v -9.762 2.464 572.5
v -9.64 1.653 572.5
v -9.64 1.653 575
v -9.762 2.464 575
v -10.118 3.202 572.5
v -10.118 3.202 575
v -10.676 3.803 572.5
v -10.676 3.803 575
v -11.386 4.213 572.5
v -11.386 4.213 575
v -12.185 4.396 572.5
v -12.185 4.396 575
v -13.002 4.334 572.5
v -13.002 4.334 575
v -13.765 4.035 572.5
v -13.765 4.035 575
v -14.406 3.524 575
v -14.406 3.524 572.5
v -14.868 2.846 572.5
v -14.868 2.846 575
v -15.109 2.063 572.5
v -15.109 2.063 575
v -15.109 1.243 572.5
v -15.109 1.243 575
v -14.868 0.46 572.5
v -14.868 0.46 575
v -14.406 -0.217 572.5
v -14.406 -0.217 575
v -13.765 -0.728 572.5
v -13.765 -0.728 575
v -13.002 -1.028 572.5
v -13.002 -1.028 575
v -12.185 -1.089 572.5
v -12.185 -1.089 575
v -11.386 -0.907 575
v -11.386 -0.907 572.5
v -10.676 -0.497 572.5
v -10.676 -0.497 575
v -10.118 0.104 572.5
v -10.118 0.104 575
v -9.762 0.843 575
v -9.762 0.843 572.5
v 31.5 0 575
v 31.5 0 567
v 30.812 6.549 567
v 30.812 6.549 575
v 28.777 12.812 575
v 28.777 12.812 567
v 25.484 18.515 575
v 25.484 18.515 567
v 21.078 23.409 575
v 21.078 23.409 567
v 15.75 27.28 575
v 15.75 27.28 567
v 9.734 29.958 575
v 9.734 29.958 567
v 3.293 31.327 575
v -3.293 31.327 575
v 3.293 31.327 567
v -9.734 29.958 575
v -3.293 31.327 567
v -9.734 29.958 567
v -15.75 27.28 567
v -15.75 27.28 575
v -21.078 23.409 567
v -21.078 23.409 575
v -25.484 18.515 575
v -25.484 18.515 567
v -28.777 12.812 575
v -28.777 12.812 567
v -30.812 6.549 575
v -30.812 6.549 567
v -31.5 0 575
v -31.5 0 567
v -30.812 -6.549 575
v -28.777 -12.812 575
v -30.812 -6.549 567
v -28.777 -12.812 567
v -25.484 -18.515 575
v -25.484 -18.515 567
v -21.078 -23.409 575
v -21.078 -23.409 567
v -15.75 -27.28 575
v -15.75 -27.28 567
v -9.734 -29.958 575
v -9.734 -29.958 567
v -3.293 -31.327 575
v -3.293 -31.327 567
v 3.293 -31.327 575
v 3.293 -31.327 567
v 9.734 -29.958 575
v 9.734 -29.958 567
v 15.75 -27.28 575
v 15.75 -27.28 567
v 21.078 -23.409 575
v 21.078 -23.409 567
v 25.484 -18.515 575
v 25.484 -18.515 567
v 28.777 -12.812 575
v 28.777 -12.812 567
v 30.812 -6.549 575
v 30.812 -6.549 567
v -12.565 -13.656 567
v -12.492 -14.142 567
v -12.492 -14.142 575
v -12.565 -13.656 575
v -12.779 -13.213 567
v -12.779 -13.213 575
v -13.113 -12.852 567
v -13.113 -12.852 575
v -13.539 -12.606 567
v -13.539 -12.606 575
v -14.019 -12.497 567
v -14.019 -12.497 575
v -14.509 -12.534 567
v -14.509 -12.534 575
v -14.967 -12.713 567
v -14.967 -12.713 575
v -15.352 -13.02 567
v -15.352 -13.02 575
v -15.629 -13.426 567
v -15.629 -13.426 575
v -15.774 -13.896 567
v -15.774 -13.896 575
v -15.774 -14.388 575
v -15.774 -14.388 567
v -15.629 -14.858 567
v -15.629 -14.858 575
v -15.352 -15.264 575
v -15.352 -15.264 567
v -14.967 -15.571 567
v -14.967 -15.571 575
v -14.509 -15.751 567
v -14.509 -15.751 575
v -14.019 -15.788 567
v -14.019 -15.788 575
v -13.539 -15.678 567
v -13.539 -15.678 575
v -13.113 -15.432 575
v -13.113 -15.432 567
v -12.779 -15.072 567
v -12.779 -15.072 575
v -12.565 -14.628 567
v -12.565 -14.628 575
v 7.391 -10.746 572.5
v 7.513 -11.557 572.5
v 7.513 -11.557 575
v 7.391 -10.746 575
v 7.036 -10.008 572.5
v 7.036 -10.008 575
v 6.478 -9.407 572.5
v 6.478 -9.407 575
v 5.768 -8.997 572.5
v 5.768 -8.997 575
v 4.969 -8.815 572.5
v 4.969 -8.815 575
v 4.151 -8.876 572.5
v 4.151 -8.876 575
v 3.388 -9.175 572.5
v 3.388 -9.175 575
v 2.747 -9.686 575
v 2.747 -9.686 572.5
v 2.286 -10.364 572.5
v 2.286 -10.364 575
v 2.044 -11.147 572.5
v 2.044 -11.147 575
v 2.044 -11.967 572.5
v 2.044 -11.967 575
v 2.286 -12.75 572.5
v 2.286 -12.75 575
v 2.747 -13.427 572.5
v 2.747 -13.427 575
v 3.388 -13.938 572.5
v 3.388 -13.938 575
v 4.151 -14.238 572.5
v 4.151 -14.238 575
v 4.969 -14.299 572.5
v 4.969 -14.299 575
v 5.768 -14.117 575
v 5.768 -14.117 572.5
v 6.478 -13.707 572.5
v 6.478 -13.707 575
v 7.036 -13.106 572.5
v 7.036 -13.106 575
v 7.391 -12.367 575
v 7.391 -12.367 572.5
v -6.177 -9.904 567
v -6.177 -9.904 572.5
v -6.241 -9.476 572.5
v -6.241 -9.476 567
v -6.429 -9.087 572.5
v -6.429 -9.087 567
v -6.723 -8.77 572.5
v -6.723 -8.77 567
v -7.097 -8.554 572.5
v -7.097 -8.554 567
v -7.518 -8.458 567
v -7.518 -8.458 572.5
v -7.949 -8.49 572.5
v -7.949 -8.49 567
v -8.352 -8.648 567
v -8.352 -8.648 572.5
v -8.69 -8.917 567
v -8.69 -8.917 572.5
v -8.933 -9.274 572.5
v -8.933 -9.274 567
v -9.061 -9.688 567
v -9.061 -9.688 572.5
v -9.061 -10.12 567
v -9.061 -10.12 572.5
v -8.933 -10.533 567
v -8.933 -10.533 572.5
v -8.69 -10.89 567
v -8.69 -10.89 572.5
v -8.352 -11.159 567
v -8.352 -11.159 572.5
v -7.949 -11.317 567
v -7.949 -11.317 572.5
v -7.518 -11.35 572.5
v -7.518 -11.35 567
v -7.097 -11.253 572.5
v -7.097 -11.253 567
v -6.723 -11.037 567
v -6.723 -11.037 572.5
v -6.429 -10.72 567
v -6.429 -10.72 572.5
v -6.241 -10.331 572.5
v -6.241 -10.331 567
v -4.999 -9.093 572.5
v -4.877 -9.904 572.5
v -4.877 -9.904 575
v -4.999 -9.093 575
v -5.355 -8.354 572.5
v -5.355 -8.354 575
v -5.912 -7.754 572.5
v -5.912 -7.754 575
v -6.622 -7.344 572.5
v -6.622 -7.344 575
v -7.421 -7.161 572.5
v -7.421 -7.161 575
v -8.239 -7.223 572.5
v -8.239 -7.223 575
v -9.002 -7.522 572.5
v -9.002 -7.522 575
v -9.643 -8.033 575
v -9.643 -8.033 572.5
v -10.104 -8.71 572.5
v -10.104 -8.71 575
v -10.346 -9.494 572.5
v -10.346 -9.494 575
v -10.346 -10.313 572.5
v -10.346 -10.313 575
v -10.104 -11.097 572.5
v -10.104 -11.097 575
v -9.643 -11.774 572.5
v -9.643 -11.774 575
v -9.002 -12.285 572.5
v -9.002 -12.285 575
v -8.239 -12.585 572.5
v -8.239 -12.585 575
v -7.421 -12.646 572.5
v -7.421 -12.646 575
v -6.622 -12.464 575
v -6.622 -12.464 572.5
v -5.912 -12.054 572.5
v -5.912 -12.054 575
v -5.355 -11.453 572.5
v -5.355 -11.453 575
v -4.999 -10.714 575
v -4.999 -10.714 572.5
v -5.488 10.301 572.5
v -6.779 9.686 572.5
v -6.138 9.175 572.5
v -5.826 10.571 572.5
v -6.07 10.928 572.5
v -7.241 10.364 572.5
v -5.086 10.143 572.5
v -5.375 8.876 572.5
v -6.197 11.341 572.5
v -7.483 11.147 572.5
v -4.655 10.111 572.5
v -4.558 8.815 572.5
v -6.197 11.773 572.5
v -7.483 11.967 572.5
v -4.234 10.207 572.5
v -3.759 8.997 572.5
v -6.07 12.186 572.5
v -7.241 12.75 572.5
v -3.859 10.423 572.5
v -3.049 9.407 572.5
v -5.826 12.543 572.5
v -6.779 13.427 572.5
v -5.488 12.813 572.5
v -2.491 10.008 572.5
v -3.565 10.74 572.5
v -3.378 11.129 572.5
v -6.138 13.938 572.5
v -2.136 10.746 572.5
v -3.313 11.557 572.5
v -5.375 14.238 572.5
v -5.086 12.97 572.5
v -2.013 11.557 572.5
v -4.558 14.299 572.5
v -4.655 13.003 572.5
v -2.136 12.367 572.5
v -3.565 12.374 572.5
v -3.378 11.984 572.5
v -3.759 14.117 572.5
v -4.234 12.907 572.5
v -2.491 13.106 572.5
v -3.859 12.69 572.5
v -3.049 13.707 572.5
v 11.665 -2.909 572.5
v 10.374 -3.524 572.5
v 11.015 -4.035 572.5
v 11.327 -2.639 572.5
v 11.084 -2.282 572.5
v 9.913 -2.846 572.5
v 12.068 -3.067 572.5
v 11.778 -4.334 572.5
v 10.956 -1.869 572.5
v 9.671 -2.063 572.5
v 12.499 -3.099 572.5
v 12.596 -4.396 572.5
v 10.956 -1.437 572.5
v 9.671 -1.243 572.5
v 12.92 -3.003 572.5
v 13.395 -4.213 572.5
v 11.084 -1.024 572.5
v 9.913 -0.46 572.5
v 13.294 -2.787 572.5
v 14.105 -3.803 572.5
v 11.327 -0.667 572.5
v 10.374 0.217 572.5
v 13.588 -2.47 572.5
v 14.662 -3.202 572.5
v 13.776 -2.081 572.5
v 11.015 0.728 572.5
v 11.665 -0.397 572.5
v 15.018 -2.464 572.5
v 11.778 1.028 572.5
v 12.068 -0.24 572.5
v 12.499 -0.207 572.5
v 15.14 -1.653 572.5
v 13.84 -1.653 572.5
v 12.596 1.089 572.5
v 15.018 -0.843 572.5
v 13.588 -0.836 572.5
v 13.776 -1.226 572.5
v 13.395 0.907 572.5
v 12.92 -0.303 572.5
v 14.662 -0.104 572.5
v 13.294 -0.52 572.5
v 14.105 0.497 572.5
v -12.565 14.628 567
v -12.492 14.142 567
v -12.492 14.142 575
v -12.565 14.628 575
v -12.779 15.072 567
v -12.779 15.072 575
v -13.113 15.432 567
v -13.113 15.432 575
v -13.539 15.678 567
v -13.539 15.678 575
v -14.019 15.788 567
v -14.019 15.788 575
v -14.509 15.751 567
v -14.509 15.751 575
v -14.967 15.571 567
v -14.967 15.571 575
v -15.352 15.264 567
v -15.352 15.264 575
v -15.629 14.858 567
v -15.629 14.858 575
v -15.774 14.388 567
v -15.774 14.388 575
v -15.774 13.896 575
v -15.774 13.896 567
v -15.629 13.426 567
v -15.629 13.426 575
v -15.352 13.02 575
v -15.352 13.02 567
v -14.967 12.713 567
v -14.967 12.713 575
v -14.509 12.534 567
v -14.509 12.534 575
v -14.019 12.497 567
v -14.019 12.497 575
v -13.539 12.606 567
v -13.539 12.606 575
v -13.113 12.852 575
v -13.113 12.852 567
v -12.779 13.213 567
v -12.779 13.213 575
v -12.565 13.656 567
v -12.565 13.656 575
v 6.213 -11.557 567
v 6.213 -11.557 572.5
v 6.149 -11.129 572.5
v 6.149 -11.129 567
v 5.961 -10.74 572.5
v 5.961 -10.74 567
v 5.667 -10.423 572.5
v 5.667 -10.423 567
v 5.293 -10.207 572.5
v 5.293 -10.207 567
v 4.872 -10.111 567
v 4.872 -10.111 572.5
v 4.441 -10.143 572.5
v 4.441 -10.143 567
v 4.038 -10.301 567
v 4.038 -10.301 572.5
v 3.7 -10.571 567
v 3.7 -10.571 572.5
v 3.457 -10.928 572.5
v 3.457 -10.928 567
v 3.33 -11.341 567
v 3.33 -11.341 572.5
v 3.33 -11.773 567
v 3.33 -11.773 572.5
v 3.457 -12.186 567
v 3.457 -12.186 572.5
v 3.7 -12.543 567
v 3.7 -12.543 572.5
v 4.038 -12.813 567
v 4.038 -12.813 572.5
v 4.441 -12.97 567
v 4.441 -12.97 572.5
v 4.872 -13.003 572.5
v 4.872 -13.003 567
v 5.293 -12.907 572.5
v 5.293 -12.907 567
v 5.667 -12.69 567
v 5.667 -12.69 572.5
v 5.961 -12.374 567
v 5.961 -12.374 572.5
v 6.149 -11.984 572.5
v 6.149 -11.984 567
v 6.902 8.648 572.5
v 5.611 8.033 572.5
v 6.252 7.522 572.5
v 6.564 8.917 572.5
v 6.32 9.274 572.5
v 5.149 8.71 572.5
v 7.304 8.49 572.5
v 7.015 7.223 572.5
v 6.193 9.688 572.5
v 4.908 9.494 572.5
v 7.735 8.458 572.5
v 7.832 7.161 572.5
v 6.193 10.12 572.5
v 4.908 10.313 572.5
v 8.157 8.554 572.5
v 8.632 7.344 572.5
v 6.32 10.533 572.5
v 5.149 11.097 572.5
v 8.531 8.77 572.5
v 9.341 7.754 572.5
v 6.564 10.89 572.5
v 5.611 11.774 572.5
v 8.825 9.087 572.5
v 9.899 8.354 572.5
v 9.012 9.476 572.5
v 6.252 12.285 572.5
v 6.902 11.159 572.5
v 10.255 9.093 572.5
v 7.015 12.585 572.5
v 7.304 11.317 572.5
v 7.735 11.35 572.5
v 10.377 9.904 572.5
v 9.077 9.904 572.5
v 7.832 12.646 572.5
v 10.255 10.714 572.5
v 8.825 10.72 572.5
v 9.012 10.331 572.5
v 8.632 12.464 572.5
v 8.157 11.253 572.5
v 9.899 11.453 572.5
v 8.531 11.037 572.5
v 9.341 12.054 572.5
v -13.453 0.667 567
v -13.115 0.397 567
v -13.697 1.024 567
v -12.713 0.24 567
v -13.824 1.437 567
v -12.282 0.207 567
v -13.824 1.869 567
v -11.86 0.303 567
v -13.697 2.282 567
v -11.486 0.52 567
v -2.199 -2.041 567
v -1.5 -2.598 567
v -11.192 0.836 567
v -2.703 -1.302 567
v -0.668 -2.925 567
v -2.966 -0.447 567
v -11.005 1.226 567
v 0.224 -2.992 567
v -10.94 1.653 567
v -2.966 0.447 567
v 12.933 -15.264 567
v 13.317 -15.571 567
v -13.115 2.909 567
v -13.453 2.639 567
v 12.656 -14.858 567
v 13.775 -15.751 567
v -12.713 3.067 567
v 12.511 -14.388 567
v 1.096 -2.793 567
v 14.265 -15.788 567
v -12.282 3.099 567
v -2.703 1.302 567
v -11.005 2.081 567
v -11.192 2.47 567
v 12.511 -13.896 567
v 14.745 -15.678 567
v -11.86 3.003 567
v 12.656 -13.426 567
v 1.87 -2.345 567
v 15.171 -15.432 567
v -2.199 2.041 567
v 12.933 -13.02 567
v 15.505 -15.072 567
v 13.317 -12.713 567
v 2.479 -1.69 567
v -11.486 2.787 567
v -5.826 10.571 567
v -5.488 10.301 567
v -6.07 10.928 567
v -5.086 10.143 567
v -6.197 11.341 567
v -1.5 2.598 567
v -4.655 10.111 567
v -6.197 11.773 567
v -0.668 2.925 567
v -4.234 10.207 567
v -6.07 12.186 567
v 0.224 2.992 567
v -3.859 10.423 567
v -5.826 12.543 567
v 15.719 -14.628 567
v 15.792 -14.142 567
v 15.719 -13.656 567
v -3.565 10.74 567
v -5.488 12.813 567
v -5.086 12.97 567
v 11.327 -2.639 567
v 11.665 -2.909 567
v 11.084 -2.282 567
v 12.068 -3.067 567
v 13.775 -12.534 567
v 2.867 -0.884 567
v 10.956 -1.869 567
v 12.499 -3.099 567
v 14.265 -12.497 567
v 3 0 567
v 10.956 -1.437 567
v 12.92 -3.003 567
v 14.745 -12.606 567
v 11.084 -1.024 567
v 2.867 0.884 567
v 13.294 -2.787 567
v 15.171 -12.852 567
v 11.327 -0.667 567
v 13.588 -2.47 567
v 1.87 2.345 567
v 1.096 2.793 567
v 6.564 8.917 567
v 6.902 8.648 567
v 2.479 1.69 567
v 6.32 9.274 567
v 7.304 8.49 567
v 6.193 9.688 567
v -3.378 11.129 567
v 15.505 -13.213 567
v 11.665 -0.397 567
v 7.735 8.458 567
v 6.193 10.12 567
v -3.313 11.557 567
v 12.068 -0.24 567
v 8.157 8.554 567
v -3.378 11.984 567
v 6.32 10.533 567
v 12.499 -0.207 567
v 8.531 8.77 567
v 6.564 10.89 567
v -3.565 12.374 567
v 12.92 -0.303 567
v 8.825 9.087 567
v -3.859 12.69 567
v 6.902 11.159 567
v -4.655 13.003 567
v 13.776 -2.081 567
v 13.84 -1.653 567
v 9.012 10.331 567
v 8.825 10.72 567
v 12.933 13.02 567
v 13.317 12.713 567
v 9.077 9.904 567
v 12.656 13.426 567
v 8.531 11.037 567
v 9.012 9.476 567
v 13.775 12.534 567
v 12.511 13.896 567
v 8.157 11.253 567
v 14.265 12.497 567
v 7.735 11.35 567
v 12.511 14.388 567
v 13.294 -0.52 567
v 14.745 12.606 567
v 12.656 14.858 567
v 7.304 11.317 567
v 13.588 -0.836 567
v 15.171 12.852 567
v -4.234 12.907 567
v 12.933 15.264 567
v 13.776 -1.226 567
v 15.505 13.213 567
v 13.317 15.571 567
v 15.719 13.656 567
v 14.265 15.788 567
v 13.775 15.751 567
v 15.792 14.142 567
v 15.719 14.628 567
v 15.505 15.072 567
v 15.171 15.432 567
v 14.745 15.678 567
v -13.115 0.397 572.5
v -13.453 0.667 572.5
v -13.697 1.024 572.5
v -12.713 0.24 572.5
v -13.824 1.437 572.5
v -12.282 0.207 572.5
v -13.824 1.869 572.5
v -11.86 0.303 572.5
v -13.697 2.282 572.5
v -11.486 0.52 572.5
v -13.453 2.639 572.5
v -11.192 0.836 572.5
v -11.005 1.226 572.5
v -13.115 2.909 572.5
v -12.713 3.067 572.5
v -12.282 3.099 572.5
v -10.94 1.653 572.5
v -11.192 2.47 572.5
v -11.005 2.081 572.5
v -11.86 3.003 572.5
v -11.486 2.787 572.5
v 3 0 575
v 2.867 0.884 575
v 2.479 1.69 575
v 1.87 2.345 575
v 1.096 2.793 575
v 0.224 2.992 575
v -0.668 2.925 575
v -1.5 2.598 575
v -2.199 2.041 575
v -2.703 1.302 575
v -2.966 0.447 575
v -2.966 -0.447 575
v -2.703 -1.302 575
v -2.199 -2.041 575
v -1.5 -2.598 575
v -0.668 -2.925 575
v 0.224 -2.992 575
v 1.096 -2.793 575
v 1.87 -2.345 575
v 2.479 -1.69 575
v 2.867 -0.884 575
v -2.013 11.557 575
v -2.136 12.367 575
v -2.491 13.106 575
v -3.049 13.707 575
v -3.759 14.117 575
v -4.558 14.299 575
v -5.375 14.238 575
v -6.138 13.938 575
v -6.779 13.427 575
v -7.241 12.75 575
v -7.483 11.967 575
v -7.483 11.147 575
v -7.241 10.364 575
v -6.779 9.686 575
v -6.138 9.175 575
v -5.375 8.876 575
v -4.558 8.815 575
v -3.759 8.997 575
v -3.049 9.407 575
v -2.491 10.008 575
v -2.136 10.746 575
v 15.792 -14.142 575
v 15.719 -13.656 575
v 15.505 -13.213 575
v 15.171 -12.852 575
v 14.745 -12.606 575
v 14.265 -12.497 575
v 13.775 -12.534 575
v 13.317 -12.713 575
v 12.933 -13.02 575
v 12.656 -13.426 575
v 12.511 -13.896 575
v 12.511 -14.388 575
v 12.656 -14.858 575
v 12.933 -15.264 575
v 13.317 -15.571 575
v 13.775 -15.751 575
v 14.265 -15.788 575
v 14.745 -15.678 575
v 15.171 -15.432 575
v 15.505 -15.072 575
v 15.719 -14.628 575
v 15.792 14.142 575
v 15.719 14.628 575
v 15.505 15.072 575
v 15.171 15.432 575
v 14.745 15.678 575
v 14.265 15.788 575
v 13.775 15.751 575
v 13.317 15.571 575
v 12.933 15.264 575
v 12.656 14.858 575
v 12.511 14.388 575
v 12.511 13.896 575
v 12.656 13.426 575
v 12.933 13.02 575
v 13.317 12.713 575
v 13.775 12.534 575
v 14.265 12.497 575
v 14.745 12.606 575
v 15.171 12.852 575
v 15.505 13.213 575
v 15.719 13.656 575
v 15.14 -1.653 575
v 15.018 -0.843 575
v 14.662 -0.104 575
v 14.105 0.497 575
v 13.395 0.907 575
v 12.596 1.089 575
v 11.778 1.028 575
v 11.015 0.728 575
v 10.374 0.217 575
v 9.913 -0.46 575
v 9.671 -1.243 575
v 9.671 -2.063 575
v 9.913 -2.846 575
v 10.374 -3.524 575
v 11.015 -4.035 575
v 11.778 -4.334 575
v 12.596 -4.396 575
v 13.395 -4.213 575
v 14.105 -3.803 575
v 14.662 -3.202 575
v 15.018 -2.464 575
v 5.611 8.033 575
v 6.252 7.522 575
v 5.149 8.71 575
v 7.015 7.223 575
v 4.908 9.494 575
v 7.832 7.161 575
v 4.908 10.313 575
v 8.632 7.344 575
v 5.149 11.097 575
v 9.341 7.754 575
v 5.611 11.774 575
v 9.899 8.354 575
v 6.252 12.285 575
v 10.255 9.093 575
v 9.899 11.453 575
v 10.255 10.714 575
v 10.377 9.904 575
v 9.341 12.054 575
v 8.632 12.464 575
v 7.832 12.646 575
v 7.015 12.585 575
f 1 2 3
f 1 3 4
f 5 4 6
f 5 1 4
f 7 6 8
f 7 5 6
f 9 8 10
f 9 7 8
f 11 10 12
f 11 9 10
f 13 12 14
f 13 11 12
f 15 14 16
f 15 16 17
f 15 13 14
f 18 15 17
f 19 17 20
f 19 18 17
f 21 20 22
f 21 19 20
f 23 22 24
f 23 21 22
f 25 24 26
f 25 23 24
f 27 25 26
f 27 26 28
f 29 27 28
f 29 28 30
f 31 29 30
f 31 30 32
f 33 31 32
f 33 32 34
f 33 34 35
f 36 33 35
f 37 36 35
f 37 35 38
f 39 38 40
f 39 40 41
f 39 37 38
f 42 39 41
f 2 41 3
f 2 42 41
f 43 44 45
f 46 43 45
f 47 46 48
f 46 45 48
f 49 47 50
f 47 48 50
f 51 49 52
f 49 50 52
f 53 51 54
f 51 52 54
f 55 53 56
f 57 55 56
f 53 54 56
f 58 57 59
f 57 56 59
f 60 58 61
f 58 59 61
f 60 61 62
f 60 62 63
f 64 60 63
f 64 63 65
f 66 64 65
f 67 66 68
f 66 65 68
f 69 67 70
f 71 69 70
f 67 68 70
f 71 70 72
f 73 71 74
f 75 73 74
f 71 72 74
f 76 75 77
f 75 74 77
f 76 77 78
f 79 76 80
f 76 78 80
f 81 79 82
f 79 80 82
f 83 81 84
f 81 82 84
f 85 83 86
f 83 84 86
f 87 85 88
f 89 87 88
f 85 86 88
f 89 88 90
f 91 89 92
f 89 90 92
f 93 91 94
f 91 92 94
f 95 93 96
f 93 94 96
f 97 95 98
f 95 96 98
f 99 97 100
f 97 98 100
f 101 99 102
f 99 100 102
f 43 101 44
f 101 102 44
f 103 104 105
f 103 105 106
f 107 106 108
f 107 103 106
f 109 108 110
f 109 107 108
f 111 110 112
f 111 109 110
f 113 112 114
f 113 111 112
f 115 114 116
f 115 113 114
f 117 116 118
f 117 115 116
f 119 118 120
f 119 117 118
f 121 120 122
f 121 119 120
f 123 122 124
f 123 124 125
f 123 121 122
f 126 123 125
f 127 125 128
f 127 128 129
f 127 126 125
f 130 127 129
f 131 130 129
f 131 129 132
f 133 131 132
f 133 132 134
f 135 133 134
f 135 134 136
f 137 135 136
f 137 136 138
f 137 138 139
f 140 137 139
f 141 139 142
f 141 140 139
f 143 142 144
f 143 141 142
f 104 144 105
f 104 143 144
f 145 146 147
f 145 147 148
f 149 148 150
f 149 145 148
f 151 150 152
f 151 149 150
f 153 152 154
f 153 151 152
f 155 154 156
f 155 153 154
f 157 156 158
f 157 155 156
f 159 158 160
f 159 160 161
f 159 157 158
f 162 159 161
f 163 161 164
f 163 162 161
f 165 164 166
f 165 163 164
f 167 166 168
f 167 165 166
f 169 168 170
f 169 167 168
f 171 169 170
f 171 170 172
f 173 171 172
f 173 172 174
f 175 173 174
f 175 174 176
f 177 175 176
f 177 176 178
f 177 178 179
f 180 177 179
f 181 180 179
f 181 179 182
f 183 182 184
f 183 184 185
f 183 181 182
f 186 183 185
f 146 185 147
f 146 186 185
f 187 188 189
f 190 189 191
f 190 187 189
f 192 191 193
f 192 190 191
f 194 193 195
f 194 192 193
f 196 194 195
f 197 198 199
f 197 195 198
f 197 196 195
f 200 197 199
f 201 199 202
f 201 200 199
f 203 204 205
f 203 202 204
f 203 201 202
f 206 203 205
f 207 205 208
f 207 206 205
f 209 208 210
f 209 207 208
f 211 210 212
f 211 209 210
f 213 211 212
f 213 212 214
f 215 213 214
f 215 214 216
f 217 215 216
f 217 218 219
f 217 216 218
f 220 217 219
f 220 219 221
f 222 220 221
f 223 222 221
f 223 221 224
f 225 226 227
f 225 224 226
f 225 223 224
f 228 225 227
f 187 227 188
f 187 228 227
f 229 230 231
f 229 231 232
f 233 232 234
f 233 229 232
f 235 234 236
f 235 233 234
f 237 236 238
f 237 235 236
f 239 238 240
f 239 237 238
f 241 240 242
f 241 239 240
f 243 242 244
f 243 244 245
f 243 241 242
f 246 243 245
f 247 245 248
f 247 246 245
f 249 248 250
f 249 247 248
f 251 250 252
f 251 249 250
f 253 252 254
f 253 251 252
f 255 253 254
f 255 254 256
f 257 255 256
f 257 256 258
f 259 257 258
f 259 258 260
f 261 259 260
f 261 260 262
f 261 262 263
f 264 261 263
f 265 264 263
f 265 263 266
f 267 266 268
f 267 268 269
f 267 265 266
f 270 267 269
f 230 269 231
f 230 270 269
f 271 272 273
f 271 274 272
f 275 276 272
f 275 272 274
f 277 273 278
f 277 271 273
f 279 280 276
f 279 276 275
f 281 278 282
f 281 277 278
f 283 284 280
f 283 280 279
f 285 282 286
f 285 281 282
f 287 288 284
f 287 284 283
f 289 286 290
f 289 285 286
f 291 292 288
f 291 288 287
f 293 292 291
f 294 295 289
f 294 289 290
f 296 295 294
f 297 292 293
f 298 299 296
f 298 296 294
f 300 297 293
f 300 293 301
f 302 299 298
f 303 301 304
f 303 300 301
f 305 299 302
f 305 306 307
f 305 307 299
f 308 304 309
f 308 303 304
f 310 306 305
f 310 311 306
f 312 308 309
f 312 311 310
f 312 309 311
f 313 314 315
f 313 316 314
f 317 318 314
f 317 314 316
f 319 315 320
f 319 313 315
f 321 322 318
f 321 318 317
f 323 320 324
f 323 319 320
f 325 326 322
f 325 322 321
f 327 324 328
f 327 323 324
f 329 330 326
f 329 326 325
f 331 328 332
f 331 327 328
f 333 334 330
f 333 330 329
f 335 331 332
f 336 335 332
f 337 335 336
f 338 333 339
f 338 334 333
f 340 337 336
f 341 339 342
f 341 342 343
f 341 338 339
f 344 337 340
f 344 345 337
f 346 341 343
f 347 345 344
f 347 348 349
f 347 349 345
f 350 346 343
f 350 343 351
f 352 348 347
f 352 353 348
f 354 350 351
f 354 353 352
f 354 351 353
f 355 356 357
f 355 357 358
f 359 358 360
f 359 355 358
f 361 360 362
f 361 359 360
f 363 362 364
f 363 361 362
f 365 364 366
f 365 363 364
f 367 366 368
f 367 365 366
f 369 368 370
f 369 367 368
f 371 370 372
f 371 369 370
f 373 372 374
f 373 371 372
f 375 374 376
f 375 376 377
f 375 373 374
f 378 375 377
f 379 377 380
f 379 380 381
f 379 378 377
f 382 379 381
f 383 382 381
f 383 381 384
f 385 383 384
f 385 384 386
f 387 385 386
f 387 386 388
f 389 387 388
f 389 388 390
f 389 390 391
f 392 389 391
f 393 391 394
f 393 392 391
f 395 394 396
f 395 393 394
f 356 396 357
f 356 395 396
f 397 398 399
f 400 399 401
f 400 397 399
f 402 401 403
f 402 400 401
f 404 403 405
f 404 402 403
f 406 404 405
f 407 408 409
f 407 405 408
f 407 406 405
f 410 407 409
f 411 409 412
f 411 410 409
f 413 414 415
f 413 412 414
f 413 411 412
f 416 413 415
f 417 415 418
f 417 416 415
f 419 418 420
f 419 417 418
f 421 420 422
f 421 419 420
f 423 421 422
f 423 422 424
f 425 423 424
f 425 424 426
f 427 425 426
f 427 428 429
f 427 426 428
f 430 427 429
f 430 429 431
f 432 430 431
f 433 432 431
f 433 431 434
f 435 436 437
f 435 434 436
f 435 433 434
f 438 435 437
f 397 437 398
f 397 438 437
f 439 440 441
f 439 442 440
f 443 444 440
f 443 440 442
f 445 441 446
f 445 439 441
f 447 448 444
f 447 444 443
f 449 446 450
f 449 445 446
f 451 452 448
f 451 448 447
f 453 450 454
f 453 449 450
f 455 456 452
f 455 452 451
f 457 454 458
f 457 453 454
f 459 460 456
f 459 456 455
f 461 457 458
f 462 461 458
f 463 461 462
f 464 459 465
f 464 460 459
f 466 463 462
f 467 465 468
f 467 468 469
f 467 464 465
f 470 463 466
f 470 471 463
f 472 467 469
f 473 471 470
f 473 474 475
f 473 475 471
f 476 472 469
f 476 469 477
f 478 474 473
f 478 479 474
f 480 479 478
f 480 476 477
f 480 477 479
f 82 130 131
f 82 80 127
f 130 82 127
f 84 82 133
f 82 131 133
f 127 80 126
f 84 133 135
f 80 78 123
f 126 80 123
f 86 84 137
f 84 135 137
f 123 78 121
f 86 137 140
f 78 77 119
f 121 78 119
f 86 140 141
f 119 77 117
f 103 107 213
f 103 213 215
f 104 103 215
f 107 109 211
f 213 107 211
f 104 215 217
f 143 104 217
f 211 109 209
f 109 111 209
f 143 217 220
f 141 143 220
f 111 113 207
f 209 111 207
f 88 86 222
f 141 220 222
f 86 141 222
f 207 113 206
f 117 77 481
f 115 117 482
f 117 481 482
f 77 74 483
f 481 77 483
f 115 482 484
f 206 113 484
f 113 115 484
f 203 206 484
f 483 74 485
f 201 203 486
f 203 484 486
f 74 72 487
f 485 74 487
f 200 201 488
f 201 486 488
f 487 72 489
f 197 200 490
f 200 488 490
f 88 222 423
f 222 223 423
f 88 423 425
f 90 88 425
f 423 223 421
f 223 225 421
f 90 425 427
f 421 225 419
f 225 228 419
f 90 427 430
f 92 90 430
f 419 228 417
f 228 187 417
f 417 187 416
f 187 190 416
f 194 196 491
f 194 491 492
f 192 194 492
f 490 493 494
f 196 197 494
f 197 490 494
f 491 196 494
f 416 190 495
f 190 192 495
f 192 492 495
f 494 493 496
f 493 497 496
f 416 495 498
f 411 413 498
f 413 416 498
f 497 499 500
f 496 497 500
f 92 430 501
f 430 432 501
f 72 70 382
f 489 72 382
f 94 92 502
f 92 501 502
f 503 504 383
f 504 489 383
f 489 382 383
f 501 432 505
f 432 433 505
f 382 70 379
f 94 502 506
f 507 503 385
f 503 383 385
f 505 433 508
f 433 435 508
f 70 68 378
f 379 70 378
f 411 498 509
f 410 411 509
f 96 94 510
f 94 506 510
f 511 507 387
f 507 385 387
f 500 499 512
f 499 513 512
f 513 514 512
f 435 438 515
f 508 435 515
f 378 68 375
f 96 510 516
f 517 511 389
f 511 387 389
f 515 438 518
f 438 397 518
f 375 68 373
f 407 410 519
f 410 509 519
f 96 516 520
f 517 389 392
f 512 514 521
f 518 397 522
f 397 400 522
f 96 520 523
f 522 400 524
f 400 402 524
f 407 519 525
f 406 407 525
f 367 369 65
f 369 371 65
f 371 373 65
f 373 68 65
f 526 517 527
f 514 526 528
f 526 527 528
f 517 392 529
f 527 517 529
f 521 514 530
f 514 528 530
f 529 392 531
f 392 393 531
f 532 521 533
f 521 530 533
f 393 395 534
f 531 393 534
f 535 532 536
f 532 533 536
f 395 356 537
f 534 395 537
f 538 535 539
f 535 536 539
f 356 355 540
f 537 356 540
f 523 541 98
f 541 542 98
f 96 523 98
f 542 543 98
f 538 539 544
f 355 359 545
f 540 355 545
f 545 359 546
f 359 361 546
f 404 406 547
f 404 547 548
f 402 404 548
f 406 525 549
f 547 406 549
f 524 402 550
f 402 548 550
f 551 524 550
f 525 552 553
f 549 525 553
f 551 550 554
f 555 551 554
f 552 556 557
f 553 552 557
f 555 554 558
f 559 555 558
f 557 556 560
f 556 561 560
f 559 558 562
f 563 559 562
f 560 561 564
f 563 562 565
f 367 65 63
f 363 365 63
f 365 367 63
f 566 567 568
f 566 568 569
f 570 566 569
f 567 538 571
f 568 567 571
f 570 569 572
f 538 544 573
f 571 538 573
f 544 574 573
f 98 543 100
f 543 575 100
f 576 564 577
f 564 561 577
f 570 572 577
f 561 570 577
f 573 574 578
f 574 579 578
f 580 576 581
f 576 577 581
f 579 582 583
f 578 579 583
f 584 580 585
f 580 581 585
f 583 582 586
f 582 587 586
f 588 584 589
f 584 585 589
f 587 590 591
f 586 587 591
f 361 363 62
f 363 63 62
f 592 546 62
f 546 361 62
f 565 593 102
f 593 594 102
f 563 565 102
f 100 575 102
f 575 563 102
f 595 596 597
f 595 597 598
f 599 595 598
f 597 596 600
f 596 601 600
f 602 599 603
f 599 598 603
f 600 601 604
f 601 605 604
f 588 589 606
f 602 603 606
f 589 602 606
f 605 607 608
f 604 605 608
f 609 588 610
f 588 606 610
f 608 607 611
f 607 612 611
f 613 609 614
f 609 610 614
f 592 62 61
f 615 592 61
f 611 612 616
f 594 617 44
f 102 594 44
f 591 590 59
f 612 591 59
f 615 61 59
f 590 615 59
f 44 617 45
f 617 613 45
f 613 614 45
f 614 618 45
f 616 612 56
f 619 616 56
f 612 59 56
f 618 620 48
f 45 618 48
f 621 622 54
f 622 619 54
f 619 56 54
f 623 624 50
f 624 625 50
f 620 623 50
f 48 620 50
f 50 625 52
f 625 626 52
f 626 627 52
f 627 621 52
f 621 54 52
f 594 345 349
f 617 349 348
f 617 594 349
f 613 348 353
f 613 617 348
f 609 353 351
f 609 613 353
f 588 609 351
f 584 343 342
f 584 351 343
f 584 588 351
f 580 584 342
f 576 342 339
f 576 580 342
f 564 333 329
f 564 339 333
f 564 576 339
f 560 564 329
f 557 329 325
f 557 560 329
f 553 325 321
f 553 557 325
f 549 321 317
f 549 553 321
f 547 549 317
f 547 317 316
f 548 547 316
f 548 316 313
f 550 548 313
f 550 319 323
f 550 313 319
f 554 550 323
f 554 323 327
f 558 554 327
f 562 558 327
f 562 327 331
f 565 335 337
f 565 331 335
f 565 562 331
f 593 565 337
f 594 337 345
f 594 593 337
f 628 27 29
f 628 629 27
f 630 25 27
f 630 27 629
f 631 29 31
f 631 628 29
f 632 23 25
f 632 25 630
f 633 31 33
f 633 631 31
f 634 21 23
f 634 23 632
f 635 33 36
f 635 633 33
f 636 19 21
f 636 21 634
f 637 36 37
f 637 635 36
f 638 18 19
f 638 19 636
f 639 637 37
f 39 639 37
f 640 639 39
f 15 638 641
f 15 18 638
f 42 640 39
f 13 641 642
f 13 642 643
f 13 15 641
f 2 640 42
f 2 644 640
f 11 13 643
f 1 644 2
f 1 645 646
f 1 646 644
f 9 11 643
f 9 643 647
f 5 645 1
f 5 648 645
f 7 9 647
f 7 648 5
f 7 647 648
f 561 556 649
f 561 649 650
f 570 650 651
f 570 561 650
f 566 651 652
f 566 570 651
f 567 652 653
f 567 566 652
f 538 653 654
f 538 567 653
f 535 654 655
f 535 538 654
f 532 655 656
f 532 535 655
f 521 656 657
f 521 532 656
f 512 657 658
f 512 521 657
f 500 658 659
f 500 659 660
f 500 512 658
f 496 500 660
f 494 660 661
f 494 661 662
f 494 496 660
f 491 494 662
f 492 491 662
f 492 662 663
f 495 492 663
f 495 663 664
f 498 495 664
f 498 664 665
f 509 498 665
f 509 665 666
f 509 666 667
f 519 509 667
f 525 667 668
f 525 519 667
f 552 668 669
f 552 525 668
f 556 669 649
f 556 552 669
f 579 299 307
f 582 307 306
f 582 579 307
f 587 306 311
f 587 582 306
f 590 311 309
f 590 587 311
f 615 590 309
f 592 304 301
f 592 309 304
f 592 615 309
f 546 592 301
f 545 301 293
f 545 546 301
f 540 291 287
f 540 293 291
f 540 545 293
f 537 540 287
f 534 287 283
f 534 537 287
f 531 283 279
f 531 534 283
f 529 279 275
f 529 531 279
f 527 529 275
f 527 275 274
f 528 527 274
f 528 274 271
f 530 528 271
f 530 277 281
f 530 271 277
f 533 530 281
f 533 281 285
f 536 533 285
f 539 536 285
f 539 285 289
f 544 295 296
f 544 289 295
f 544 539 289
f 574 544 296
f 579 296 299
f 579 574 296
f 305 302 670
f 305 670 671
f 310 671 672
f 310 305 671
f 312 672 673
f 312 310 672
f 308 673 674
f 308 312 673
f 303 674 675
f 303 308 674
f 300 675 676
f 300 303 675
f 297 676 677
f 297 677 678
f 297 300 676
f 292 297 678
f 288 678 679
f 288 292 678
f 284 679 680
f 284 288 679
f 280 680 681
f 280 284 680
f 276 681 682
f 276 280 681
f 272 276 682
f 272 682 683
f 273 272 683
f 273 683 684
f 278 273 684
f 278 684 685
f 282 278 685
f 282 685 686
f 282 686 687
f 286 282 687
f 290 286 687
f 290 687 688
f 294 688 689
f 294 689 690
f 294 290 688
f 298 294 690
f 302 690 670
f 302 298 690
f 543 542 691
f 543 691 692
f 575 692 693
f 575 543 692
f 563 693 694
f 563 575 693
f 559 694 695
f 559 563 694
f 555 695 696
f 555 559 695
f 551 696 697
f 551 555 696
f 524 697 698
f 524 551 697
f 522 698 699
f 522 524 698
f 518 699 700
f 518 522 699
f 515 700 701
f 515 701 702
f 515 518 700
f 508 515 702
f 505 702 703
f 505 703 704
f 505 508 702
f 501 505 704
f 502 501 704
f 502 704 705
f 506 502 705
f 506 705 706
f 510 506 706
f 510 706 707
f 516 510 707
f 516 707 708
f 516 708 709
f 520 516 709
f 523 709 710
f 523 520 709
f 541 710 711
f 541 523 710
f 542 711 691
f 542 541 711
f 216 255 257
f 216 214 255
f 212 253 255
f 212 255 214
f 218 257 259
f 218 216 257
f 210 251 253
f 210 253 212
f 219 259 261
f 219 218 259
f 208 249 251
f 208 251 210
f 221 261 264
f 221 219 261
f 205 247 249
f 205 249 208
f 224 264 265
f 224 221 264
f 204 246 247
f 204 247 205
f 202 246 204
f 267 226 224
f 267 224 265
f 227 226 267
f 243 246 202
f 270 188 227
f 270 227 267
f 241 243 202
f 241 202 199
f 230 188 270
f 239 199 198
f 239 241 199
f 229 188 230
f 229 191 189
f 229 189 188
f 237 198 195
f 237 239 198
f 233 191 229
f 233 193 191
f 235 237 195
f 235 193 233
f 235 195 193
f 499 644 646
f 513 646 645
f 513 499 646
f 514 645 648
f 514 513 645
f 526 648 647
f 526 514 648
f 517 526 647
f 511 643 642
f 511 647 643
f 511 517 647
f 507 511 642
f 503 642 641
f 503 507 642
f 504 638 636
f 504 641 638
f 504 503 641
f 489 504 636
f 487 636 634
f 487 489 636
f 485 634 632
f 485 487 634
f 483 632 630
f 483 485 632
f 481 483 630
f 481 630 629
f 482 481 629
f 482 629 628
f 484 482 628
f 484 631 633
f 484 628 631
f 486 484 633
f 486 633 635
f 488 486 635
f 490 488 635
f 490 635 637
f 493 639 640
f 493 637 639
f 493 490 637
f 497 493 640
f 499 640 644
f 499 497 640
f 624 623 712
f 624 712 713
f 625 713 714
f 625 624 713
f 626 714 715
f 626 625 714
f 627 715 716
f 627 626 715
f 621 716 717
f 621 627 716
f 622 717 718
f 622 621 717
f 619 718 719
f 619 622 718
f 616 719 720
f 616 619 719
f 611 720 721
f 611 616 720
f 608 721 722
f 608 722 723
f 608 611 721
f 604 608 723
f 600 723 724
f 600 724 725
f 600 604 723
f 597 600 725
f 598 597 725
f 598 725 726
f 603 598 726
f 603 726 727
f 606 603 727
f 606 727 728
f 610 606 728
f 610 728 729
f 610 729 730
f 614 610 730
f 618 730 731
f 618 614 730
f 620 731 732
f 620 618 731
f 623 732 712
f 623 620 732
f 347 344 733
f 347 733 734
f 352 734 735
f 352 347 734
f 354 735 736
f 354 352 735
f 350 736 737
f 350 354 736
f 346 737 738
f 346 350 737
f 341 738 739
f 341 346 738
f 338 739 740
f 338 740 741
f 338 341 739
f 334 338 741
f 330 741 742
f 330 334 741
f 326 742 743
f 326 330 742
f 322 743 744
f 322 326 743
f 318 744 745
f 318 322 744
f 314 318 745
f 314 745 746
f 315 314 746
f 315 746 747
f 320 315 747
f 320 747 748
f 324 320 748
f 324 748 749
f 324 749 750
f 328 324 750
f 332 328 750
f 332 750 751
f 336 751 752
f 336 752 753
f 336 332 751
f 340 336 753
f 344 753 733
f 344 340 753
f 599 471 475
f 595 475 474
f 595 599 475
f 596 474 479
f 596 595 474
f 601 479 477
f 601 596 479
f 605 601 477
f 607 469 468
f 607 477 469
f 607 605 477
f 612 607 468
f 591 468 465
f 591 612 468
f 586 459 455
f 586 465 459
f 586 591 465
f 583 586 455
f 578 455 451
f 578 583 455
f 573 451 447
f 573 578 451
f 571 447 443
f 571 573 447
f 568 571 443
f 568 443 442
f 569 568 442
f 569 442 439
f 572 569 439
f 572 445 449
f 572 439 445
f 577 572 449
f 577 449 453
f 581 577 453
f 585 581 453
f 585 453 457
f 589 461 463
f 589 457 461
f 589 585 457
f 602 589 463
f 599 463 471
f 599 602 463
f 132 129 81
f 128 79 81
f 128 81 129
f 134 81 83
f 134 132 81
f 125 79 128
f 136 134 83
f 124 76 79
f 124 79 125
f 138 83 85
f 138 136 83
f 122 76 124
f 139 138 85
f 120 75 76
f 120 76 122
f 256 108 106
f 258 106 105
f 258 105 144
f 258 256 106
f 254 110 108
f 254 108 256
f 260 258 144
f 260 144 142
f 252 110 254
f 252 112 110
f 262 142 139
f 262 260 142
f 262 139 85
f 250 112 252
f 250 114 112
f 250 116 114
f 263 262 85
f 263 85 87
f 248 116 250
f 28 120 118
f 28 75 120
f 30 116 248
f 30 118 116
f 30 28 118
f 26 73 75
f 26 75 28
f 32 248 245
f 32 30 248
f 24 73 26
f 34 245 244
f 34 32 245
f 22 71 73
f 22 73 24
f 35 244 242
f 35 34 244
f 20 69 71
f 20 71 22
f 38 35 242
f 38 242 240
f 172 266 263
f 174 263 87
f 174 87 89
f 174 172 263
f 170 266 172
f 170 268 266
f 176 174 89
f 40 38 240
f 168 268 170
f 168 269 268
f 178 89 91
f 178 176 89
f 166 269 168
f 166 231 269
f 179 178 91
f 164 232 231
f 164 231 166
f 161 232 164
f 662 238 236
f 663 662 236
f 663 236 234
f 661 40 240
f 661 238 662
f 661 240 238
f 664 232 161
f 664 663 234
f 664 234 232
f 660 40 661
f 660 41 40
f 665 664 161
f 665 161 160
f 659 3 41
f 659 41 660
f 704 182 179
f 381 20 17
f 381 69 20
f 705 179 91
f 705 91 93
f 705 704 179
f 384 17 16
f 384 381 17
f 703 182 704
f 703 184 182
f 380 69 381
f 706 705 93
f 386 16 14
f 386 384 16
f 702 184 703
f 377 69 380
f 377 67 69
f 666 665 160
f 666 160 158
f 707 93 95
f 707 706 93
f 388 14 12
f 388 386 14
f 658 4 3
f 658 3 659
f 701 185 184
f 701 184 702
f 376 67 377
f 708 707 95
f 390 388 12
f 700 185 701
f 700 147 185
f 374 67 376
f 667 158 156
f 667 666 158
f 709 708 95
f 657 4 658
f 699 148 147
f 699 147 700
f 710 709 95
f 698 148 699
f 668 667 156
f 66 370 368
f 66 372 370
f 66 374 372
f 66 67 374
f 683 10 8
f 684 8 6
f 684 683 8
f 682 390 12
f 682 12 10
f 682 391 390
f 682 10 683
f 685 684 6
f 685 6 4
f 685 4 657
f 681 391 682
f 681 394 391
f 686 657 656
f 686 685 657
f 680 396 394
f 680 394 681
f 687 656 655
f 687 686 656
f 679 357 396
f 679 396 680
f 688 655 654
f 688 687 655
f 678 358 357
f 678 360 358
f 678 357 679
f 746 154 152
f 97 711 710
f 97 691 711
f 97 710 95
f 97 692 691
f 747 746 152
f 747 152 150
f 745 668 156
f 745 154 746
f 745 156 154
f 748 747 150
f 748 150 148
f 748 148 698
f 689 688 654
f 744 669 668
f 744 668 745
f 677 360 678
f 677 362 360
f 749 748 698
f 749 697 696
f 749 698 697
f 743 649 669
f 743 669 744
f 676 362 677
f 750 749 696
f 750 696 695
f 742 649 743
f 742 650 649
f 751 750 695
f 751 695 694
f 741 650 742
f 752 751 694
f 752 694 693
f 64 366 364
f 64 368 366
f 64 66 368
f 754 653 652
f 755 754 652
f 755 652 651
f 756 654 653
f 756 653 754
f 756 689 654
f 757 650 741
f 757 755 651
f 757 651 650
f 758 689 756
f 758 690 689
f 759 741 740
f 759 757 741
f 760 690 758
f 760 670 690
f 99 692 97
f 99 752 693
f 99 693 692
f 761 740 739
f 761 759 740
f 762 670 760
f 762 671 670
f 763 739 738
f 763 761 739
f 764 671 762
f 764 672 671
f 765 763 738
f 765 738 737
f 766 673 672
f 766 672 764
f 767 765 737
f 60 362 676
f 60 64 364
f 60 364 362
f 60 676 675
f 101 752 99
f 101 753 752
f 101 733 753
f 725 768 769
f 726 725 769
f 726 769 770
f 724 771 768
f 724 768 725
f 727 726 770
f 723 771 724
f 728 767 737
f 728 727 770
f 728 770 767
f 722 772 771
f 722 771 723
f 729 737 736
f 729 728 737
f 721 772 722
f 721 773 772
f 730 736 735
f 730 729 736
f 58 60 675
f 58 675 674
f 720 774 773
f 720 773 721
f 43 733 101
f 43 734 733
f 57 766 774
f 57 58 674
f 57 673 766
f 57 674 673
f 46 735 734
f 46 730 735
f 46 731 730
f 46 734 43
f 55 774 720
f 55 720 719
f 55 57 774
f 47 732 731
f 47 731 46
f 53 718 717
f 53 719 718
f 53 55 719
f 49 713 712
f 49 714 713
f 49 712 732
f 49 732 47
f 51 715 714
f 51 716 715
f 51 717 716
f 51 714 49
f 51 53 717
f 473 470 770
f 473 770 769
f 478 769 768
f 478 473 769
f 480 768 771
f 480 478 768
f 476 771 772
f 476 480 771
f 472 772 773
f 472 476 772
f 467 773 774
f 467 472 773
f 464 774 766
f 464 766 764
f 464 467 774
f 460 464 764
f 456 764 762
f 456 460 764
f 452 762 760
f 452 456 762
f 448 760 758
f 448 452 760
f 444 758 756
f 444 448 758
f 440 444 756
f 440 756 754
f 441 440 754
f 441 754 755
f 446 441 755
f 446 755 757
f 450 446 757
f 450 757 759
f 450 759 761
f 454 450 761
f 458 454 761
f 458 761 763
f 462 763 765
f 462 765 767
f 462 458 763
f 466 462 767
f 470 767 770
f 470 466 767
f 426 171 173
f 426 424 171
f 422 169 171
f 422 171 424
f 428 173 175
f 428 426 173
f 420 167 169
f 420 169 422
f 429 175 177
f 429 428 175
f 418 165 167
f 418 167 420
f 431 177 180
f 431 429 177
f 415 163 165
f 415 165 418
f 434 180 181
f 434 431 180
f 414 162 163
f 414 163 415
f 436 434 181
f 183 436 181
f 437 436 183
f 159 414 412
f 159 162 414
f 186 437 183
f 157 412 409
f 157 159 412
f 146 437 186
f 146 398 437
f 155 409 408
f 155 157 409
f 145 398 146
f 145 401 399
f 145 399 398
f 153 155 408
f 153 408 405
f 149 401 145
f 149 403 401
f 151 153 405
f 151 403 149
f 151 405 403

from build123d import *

# Parameters (mm, degrees)
BRIDA_START                  = 567
SK_BRIDA_R                   = 31.5
BRIDA_DEPTH                  = 8
CENTRO_START                 = 567
SK_CENTRO_R                  = 3
CENTRO_DEPTH                 = 8
ROSCAS_M4_HERRAMIENTA_START  = 567
SK_ROSCAS_M4_HERRAMIENTA_R   = 1.65
ROSCAS_M4_HERRAMIENTA_DEPTH  = 8
PASANTES_M2_5_ROTOR_J6_START = 567
SK_PASANTES_M2_5_ROTOR_J6_R  = 1.45
PASANTES_M2_5_ROTOR_J6_DEPTH = 8
CAJAS_M2_5_START             = 572.5
SK_CAJAS_M2_5_R              = 2.75
CAJAS_M2_5_DEPTH             = 2.5


with BuildPart() as part:
    # Sk_Brida → Brida (new body)
    with BuildSketch(Plane.XY.offset(BRIDA_START)):
        Circle(SK_BRIDA_R)
    extrude(amount=BRIDA_DEPTH)

    # Sk_Centro → Centro (cut)
    with BuildSketch(Plane.XY.offset(CENTRO_START)):
        Circle(SK_CENTRO_R)
    extrude(amount=CENTRO_DEPTH, mode=Mode.SUBTRACT)

    # Sk_Roscas_M4_herramienta → Roscas_M4_herramienta (cut)
    with BuildSketch(Plane.XY.offset(ROSCAS_M4_HERRAMIENTA_START)):
        with Locations((14.142135624, 14.142135624)):
            Circle(SK_ROSCAS_M4_HERRAMIENTA_R)
        with Locations((-14.142135624, 14.142135624)):
            Circle(SK_ROSCAS_M4_HERRAMIENTA_R)
        with Locations((-14.142135624, -14.142135624)):
            Circle(SK_ROSCAS_M4_HERRAMIENTA_R)
        with Locations((14.142135624, -14.142135624)):
            Circle(SK_ROSCAS_M4_HERRAMIENTA_R)
    extrude(amount=ROSCAS_M4_HERRAMIENTA_DEPTH, mode=Mode.SUBTRACT)

    # Sk_Pasantes_M2-5_rotor_J6 → Pasantes_M2-5_rotor_J6 (cut)
    with BuildSketch(Plane.XY.offset(PASANTES_M2_5_ROTOR_J6_START)):
        with Locations((12.390194253, -1.653204878)):
            Circle(SK_PASANTES_M2_5_ROTOR_J6_R)
        with Locations((7.626814549, 9.903620542)):
            Circle(SK_PASANTES_M2_5_ROTOR_J6_R)
        with Locations((-4.763379704, 11.55682542)):
            Circle(SK_PASANTES_M2_5_ROTOR_J6_R)
        with Locations((-12.390194253, 1.653204878)):
            Circle(SK_PASANTES_M2_5_ROTOR_J6_R)
        with Locations((-7.626814549, -9.903620542)):
            Circle(SK_PASANTES_M2_5_ROTOR_J6_R)
        with Locations((4.763379704, -11.55682542)):
            Circle(SK_PASANTES_M2_5_ROTOR_J6_R)
    extrude(amount=PASANTES_M2_5_ROTOR_J6_DEPTH, mode=Mode.SUBTRACT)

    # Sk_Cajas_M2-5 → Cajas_M2-5 (cut)
    with BuildSketch(Plane.XY.offset(CAJAS_M2_5_START)):
        with Locations((12.390194253, -1.653204878)):
            Circle(SK_CAJAS_M2_5_R)
        with Locations((7.626814549, 9.903620542)):
            Circle(SK_CAJAS_M2_5_R)
        with Locations((-4.763379704, 11.55682542)):
            Circle(SK_CAJAS_M2_5_R)
        with Locations((-12.390194253, 1.653204878)):
            Circle(SK_CAJAS_M2_5_R)
        with Locations((-7.626814549, -9.903620542)):
            Circle(SK_CAJAS_M2_5_R)
        with Locations((4.763379704, -11.55682542)):
            Circle(SK_CAJAS_M2_5_R)
    extrude(amount=CAJAS_M2_5_DEPTH, mode=Mode.SUBTRACT)


solid = part.part
